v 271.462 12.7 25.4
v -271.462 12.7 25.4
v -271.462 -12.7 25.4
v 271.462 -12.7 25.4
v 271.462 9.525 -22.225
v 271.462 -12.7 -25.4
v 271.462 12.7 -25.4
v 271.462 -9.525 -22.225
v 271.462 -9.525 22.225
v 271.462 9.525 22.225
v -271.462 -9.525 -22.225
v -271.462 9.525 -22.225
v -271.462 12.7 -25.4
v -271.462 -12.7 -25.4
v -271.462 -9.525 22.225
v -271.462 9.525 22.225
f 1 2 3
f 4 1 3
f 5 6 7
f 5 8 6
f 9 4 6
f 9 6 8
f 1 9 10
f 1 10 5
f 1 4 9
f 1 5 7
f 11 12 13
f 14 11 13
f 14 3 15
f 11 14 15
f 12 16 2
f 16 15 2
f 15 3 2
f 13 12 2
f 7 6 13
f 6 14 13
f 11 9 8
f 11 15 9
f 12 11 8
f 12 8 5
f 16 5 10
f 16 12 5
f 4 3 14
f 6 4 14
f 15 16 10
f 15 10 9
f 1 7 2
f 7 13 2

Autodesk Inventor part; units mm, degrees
ref_plane "YZ Plane" through (0, 0, 0) normal (1, 0, 0) x (0, 1, 0)
ref_plane "XZ Plane" through (0, 0, 0) normal (0, 1, 0) x (-1, 0, 0)
ref_plane "XY Plane" through (0, 0, 0) normal (0, 0, 1) x (1, 0, 0)
sketch "Sketch1" plane through (0, 0, 0) normal (1, 0, 0) x (0, 1, 0)
  line L0 (-12.7, 25.4) -> (-12.7, -25.4)
  line L1 (-12.7, -25.4) -> (12.7, -25.4)
  line L2 (12.7, -25.4) -> (12.7, 25.4)
  line L3 (12.7, 25.4) -> (-12.7, 25.4)
  line L4 (-12.7, 25.4) -> (12.7, -25.4) construction
  line L5 (-12.7, -25.4) -> (12.7, 25.4) construction
  line L6 (-9.525, 22.225) -> (-9.525, -22.225)
  line L7 (-9.525, -22.225) -> (9.525, -22.225)
  line L8 (9.525, -22.225) -> (9.525, 22.225)
  line L9 (9.525, 22.225) -> (-9.525, 22.225)
  line L10 (-9.525, 22.225) -> (9.525, -22.225) construction
  line L11 (-9.525, -22.225) -> (9.525, 22.225) construction
  point P0 (0, 0)
  dimension "d0" = 25.4
  dimension "d1" = 50.8
  dimension "d2" = 3.175
  dimension "d3" = 3.175
extrude "Extrusion1" add sketch "Sketch1" along normal mid plane 542.925
equation "\"d0\" = width"
equation "\"d1\" = height"
equation "\"d2\" = wallThickness"
equation "\"d3\" = wallThickness"
equation "\"d4\" = length"
equation "\"width\" = 25.4"
equation "\"height\" = 50.8"
equation "\"length\" = 542.925"
equation "\"wallThickness\" = 3.175"
properties part number "1x2_alumTubing" material "Aluminum 6061"
